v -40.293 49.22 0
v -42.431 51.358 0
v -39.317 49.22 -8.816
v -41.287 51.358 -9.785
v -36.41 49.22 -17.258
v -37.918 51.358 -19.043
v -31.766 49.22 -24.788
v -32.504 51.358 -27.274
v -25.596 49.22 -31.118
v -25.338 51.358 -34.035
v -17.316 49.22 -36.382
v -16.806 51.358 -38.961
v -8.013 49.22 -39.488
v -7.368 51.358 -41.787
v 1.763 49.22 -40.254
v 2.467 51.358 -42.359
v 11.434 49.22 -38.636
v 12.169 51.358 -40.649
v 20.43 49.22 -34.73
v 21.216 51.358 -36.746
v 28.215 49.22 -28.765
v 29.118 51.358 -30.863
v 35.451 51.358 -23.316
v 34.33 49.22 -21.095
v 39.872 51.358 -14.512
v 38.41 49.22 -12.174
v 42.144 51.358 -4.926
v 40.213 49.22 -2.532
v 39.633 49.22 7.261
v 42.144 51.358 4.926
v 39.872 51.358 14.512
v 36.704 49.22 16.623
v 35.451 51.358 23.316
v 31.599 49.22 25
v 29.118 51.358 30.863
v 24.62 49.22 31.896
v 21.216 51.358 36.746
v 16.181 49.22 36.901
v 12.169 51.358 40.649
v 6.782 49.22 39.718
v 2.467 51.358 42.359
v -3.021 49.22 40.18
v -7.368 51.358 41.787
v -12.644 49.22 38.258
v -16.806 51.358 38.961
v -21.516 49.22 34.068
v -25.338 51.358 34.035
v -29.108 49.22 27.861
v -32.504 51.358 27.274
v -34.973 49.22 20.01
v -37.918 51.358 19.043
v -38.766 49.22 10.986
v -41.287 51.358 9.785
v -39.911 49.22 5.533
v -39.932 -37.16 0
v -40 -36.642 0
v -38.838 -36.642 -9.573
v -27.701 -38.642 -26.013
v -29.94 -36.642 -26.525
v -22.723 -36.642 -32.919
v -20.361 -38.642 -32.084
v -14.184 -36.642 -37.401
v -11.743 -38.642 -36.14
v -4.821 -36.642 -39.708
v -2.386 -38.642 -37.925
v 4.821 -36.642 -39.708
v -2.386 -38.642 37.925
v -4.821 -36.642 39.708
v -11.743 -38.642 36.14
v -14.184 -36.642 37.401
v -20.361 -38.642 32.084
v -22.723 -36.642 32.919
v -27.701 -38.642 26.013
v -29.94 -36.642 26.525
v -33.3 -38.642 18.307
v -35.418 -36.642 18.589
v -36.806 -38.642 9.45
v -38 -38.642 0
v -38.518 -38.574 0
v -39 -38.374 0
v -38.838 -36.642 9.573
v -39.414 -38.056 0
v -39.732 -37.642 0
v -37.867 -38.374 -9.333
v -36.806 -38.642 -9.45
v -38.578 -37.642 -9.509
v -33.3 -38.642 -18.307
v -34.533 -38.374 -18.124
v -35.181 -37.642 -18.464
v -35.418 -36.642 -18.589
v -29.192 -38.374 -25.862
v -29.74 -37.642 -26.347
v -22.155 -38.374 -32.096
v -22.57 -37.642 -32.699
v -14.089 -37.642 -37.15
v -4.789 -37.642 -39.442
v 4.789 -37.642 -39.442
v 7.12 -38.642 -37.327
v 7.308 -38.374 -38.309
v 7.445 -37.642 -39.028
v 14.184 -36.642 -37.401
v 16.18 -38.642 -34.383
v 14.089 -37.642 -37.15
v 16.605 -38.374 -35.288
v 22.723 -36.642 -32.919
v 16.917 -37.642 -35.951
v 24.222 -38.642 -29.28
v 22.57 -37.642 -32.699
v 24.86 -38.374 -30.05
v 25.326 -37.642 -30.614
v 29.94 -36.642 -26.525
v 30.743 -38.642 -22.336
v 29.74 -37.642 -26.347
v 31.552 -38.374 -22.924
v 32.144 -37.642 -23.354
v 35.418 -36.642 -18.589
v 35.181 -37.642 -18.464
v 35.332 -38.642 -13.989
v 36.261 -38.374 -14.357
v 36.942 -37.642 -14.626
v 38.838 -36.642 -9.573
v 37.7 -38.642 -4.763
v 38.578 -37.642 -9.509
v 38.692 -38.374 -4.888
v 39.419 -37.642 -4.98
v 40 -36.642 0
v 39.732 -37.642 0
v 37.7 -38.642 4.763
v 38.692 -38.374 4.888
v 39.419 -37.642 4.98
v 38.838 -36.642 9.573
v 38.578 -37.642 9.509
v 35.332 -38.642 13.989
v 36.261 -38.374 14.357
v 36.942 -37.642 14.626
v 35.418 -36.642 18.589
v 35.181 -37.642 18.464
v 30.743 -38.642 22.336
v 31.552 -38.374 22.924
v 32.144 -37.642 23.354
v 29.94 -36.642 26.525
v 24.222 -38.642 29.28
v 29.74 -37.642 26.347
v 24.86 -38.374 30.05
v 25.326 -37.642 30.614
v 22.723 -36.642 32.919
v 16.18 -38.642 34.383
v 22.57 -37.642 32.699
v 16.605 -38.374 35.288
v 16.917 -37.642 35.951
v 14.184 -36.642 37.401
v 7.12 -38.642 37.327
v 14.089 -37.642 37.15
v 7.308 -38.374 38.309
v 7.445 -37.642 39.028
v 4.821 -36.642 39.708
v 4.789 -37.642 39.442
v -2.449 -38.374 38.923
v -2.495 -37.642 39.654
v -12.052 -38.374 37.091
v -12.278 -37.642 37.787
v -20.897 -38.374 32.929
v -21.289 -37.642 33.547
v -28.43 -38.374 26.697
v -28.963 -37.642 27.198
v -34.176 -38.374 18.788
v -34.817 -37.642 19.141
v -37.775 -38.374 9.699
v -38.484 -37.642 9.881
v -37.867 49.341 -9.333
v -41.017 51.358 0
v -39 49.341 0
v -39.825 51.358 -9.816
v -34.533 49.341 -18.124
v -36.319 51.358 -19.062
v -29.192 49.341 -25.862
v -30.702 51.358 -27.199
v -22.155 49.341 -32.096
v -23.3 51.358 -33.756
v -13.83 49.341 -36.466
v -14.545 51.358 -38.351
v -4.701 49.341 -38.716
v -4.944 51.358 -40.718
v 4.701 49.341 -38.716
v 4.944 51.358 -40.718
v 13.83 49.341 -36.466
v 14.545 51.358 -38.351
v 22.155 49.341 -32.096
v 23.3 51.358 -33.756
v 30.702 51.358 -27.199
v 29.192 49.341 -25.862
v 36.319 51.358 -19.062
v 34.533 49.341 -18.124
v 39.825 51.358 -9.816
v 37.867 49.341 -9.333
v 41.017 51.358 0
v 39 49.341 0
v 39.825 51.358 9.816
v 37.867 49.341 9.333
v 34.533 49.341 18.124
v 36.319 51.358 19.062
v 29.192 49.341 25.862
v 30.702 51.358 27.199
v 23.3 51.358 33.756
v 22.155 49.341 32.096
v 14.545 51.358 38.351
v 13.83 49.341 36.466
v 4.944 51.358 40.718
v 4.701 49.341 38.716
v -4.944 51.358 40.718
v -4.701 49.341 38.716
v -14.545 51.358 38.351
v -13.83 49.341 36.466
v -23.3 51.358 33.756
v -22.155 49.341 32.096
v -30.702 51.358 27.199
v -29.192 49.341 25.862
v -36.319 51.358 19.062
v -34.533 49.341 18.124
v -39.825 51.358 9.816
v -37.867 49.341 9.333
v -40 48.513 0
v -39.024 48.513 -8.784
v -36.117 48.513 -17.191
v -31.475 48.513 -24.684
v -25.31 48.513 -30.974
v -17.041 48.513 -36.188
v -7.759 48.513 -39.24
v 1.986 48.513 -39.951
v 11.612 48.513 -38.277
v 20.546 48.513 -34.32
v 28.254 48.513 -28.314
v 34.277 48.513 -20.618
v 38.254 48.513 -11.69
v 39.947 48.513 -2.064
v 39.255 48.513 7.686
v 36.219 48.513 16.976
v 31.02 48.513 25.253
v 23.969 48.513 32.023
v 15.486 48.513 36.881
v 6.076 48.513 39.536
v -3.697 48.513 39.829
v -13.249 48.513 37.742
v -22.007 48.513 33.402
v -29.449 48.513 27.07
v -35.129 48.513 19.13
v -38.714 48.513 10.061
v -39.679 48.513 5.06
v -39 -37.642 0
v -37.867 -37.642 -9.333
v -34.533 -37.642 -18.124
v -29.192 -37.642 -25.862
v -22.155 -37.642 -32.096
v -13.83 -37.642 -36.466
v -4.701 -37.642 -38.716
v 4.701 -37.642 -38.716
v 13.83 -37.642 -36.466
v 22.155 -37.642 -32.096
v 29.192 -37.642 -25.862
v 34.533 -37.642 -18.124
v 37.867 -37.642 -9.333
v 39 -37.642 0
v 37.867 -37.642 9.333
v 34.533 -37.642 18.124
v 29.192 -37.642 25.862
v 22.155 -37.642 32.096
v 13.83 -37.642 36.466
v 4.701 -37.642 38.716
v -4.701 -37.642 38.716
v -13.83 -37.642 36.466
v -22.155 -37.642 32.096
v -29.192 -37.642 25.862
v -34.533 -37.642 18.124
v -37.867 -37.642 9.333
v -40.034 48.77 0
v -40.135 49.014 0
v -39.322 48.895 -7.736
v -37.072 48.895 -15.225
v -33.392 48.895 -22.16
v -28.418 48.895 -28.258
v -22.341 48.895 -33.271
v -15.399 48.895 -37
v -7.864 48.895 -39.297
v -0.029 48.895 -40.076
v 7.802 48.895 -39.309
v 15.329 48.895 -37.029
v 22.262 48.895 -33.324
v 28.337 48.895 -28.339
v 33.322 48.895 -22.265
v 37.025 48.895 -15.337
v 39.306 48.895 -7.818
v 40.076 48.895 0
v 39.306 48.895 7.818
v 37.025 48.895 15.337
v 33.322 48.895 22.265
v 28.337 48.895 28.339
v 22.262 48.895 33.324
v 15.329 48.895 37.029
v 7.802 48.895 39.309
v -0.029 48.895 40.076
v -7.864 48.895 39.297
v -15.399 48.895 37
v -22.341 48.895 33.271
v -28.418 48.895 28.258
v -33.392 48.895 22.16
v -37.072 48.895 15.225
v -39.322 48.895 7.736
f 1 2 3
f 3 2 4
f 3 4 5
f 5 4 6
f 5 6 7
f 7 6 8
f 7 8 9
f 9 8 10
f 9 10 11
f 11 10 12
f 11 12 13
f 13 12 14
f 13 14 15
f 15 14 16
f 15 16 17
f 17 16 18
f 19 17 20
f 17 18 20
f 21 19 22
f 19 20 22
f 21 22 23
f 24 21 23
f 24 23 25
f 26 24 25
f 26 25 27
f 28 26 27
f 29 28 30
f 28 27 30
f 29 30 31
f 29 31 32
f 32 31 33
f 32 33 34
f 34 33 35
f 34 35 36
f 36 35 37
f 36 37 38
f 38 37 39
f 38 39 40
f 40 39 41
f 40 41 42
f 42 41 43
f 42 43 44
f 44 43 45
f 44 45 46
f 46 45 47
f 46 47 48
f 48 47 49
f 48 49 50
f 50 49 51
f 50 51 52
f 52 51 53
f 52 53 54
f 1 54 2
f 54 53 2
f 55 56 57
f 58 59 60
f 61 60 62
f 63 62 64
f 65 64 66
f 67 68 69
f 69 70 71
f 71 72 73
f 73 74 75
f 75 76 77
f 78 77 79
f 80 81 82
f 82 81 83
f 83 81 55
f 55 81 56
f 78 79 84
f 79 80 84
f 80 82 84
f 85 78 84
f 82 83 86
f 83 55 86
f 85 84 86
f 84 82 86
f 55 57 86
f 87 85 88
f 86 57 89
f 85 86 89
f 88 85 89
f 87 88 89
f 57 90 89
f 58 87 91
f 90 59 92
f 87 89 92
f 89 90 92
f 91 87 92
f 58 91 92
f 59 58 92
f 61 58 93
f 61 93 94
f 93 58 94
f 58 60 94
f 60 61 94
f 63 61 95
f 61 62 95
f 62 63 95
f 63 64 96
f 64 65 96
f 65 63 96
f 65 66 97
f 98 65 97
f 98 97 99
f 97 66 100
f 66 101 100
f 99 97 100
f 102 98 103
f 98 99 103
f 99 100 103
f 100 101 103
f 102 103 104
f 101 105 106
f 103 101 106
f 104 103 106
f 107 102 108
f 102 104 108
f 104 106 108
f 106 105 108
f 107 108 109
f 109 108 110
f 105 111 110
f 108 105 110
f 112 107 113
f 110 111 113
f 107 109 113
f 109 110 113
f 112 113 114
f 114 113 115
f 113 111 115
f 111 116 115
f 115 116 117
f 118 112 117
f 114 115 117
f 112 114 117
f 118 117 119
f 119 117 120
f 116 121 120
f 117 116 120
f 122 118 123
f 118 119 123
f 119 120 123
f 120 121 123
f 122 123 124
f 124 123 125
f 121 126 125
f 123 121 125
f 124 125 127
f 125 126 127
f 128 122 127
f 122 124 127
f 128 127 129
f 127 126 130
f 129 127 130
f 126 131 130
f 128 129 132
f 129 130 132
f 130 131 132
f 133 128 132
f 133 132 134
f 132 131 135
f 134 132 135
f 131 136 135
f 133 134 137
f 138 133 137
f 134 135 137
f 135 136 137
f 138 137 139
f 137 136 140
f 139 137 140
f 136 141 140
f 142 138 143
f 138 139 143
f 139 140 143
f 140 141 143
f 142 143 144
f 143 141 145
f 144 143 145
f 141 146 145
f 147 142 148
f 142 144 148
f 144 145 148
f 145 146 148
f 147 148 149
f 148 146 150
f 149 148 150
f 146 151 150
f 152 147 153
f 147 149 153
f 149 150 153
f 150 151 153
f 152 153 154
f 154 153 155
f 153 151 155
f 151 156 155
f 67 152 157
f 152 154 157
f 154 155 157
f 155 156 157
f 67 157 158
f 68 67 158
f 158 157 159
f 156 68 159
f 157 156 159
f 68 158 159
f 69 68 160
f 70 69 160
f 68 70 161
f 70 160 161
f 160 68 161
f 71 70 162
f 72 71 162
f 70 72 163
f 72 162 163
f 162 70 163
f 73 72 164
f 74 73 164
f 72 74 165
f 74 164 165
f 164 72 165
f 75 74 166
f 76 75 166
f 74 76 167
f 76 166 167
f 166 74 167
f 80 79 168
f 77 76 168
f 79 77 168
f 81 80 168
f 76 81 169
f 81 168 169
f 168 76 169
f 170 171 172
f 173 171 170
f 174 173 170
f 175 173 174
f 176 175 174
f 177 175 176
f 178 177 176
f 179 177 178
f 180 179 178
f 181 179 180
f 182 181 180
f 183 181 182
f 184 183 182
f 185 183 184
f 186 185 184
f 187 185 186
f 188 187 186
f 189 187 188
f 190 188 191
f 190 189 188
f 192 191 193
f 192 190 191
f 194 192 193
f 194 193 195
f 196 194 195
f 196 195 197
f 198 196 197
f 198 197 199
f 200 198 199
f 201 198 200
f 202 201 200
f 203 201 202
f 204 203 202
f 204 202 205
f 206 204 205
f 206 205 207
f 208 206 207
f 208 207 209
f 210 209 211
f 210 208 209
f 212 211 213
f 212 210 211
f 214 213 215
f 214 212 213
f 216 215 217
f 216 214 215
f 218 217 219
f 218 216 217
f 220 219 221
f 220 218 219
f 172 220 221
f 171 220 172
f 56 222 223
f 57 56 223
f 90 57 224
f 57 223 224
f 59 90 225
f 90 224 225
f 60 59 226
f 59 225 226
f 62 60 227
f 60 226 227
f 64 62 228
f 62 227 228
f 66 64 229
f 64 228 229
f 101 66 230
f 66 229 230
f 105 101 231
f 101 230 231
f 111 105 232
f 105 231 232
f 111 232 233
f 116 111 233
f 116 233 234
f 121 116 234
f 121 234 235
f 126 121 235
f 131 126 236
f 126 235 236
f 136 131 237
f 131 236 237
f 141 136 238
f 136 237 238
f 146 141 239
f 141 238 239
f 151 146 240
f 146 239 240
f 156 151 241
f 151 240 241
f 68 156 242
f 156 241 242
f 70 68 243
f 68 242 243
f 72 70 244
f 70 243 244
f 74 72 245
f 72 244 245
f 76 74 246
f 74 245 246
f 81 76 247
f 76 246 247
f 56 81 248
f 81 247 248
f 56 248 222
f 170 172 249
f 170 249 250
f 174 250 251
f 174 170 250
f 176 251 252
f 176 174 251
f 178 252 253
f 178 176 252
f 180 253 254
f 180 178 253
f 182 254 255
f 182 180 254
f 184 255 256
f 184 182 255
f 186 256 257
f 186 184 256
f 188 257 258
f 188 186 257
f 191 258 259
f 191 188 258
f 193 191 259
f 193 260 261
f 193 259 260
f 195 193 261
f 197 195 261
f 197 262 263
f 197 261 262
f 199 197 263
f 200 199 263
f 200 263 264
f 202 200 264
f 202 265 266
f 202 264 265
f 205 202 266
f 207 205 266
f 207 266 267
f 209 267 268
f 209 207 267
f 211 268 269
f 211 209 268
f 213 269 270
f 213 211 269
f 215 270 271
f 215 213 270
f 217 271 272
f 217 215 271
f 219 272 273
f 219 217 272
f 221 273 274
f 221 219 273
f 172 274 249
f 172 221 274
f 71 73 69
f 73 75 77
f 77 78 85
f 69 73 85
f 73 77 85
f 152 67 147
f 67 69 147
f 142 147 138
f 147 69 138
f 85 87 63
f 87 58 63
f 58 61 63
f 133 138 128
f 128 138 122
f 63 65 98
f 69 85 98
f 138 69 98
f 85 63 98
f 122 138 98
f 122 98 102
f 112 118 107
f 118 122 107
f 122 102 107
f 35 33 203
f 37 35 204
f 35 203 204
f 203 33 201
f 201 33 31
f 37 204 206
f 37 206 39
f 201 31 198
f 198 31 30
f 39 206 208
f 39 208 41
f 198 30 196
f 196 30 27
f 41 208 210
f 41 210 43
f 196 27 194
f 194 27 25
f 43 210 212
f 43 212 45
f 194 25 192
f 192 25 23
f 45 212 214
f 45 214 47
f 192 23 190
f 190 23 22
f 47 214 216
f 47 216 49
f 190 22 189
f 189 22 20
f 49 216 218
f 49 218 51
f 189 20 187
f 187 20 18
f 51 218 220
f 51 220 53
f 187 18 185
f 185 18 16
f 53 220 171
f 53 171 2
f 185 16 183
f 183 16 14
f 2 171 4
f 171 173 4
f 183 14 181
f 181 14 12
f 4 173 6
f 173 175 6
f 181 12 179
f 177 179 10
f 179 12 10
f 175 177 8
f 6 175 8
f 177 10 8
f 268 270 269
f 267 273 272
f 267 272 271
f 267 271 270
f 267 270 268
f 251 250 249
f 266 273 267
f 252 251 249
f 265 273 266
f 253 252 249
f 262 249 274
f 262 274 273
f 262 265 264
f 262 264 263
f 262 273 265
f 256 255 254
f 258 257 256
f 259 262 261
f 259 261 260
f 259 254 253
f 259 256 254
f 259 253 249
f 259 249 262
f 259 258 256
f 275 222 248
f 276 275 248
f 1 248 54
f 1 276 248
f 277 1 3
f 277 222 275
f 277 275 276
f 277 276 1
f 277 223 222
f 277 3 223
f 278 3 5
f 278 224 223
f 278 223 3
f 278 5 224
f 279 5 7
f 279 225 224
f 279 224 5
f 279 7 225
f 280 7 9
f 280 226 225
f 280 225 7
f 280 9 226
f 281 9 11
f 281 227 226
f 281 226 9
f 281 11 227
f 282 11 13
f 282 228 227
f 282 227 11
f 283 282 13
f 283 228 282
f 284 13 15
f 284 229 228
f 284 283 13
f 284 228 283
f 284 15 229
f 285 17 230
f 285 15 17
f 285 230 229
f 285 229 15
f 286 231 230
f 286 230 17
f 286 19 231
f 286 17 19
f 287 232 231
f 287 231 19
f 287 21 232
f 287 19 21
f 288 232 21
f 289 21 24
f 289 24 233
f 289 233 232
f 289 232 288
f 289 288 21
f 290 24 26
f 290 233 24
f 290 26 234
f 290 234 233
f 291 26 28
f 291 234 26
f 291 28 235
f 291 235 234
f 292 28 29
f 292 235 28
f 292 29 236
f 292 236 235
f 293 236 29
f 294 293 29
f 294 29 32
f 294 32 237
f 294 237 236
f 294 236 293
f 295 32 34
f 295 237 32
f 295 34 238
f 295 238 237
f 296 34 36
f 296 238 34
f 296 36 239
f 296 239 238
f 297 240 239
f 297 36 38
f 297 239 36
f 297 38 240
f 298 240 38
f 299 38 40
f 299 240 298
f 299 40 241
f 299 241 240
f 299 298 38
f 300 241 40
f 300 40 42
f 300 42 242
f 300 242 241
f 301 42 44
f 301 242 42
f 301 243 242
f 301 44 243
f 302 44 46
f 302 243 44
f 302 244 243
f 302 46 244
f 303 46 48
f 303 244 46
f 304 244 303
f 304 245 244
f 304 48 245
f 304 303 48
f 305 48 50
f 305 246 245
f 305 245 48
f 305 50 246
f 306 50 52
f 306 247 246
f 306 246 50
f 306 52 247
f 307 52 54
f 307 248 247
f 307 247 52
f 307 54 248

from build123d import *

# Parameters (mm, degrees)
SHELL2_T  = -1
FILLET1_R = 2
FILLET2_R = 1


with BuildPart() as part:
    # Sketch1 → Revolve1 (revolve)
    with BuildSketch(Plane.XY, mode=Mode.PRIVATE) as revolve1_sk:
        Polygon((0, -38.642009768), (40, -38.642009768), (40, 48.926842765), (42.431147467, 51.357990232), (0, 51.357990232), align=None)
    revolve(revolve1_sk.sketch.rotate(Axis((0, 51.357990232, 0), (0, -1, 0)), 180), axis=Axis((0, 51.357990232, 0), (0, -1, 0)))

    # Shell2
    shell2_openings = [part.faces().sort_by_distance(p)[0] for p in [
        (0, 51.357990232, 0),
    ]]
    offset(amount=SHELL2_T, openings=shell2_openings, kind=Kind.INTERSECTION)

    # Fillet1
    fillet1_edges = [part.edges().sort_by_distance(p)[0] for p in [
        (40, -38.642009768, 0),
    ]]
    fillet(fillet1_edges, radius=FILLET1_R)

    # Fillet2
    fillet2_edges = [part.edges().sort_by_distance(p)[0] for p in [
        (40, 48.926842765, 0),
    ]]
    fillet(fillet2_edges, radius=FILLET2_R)


solid = part.part
